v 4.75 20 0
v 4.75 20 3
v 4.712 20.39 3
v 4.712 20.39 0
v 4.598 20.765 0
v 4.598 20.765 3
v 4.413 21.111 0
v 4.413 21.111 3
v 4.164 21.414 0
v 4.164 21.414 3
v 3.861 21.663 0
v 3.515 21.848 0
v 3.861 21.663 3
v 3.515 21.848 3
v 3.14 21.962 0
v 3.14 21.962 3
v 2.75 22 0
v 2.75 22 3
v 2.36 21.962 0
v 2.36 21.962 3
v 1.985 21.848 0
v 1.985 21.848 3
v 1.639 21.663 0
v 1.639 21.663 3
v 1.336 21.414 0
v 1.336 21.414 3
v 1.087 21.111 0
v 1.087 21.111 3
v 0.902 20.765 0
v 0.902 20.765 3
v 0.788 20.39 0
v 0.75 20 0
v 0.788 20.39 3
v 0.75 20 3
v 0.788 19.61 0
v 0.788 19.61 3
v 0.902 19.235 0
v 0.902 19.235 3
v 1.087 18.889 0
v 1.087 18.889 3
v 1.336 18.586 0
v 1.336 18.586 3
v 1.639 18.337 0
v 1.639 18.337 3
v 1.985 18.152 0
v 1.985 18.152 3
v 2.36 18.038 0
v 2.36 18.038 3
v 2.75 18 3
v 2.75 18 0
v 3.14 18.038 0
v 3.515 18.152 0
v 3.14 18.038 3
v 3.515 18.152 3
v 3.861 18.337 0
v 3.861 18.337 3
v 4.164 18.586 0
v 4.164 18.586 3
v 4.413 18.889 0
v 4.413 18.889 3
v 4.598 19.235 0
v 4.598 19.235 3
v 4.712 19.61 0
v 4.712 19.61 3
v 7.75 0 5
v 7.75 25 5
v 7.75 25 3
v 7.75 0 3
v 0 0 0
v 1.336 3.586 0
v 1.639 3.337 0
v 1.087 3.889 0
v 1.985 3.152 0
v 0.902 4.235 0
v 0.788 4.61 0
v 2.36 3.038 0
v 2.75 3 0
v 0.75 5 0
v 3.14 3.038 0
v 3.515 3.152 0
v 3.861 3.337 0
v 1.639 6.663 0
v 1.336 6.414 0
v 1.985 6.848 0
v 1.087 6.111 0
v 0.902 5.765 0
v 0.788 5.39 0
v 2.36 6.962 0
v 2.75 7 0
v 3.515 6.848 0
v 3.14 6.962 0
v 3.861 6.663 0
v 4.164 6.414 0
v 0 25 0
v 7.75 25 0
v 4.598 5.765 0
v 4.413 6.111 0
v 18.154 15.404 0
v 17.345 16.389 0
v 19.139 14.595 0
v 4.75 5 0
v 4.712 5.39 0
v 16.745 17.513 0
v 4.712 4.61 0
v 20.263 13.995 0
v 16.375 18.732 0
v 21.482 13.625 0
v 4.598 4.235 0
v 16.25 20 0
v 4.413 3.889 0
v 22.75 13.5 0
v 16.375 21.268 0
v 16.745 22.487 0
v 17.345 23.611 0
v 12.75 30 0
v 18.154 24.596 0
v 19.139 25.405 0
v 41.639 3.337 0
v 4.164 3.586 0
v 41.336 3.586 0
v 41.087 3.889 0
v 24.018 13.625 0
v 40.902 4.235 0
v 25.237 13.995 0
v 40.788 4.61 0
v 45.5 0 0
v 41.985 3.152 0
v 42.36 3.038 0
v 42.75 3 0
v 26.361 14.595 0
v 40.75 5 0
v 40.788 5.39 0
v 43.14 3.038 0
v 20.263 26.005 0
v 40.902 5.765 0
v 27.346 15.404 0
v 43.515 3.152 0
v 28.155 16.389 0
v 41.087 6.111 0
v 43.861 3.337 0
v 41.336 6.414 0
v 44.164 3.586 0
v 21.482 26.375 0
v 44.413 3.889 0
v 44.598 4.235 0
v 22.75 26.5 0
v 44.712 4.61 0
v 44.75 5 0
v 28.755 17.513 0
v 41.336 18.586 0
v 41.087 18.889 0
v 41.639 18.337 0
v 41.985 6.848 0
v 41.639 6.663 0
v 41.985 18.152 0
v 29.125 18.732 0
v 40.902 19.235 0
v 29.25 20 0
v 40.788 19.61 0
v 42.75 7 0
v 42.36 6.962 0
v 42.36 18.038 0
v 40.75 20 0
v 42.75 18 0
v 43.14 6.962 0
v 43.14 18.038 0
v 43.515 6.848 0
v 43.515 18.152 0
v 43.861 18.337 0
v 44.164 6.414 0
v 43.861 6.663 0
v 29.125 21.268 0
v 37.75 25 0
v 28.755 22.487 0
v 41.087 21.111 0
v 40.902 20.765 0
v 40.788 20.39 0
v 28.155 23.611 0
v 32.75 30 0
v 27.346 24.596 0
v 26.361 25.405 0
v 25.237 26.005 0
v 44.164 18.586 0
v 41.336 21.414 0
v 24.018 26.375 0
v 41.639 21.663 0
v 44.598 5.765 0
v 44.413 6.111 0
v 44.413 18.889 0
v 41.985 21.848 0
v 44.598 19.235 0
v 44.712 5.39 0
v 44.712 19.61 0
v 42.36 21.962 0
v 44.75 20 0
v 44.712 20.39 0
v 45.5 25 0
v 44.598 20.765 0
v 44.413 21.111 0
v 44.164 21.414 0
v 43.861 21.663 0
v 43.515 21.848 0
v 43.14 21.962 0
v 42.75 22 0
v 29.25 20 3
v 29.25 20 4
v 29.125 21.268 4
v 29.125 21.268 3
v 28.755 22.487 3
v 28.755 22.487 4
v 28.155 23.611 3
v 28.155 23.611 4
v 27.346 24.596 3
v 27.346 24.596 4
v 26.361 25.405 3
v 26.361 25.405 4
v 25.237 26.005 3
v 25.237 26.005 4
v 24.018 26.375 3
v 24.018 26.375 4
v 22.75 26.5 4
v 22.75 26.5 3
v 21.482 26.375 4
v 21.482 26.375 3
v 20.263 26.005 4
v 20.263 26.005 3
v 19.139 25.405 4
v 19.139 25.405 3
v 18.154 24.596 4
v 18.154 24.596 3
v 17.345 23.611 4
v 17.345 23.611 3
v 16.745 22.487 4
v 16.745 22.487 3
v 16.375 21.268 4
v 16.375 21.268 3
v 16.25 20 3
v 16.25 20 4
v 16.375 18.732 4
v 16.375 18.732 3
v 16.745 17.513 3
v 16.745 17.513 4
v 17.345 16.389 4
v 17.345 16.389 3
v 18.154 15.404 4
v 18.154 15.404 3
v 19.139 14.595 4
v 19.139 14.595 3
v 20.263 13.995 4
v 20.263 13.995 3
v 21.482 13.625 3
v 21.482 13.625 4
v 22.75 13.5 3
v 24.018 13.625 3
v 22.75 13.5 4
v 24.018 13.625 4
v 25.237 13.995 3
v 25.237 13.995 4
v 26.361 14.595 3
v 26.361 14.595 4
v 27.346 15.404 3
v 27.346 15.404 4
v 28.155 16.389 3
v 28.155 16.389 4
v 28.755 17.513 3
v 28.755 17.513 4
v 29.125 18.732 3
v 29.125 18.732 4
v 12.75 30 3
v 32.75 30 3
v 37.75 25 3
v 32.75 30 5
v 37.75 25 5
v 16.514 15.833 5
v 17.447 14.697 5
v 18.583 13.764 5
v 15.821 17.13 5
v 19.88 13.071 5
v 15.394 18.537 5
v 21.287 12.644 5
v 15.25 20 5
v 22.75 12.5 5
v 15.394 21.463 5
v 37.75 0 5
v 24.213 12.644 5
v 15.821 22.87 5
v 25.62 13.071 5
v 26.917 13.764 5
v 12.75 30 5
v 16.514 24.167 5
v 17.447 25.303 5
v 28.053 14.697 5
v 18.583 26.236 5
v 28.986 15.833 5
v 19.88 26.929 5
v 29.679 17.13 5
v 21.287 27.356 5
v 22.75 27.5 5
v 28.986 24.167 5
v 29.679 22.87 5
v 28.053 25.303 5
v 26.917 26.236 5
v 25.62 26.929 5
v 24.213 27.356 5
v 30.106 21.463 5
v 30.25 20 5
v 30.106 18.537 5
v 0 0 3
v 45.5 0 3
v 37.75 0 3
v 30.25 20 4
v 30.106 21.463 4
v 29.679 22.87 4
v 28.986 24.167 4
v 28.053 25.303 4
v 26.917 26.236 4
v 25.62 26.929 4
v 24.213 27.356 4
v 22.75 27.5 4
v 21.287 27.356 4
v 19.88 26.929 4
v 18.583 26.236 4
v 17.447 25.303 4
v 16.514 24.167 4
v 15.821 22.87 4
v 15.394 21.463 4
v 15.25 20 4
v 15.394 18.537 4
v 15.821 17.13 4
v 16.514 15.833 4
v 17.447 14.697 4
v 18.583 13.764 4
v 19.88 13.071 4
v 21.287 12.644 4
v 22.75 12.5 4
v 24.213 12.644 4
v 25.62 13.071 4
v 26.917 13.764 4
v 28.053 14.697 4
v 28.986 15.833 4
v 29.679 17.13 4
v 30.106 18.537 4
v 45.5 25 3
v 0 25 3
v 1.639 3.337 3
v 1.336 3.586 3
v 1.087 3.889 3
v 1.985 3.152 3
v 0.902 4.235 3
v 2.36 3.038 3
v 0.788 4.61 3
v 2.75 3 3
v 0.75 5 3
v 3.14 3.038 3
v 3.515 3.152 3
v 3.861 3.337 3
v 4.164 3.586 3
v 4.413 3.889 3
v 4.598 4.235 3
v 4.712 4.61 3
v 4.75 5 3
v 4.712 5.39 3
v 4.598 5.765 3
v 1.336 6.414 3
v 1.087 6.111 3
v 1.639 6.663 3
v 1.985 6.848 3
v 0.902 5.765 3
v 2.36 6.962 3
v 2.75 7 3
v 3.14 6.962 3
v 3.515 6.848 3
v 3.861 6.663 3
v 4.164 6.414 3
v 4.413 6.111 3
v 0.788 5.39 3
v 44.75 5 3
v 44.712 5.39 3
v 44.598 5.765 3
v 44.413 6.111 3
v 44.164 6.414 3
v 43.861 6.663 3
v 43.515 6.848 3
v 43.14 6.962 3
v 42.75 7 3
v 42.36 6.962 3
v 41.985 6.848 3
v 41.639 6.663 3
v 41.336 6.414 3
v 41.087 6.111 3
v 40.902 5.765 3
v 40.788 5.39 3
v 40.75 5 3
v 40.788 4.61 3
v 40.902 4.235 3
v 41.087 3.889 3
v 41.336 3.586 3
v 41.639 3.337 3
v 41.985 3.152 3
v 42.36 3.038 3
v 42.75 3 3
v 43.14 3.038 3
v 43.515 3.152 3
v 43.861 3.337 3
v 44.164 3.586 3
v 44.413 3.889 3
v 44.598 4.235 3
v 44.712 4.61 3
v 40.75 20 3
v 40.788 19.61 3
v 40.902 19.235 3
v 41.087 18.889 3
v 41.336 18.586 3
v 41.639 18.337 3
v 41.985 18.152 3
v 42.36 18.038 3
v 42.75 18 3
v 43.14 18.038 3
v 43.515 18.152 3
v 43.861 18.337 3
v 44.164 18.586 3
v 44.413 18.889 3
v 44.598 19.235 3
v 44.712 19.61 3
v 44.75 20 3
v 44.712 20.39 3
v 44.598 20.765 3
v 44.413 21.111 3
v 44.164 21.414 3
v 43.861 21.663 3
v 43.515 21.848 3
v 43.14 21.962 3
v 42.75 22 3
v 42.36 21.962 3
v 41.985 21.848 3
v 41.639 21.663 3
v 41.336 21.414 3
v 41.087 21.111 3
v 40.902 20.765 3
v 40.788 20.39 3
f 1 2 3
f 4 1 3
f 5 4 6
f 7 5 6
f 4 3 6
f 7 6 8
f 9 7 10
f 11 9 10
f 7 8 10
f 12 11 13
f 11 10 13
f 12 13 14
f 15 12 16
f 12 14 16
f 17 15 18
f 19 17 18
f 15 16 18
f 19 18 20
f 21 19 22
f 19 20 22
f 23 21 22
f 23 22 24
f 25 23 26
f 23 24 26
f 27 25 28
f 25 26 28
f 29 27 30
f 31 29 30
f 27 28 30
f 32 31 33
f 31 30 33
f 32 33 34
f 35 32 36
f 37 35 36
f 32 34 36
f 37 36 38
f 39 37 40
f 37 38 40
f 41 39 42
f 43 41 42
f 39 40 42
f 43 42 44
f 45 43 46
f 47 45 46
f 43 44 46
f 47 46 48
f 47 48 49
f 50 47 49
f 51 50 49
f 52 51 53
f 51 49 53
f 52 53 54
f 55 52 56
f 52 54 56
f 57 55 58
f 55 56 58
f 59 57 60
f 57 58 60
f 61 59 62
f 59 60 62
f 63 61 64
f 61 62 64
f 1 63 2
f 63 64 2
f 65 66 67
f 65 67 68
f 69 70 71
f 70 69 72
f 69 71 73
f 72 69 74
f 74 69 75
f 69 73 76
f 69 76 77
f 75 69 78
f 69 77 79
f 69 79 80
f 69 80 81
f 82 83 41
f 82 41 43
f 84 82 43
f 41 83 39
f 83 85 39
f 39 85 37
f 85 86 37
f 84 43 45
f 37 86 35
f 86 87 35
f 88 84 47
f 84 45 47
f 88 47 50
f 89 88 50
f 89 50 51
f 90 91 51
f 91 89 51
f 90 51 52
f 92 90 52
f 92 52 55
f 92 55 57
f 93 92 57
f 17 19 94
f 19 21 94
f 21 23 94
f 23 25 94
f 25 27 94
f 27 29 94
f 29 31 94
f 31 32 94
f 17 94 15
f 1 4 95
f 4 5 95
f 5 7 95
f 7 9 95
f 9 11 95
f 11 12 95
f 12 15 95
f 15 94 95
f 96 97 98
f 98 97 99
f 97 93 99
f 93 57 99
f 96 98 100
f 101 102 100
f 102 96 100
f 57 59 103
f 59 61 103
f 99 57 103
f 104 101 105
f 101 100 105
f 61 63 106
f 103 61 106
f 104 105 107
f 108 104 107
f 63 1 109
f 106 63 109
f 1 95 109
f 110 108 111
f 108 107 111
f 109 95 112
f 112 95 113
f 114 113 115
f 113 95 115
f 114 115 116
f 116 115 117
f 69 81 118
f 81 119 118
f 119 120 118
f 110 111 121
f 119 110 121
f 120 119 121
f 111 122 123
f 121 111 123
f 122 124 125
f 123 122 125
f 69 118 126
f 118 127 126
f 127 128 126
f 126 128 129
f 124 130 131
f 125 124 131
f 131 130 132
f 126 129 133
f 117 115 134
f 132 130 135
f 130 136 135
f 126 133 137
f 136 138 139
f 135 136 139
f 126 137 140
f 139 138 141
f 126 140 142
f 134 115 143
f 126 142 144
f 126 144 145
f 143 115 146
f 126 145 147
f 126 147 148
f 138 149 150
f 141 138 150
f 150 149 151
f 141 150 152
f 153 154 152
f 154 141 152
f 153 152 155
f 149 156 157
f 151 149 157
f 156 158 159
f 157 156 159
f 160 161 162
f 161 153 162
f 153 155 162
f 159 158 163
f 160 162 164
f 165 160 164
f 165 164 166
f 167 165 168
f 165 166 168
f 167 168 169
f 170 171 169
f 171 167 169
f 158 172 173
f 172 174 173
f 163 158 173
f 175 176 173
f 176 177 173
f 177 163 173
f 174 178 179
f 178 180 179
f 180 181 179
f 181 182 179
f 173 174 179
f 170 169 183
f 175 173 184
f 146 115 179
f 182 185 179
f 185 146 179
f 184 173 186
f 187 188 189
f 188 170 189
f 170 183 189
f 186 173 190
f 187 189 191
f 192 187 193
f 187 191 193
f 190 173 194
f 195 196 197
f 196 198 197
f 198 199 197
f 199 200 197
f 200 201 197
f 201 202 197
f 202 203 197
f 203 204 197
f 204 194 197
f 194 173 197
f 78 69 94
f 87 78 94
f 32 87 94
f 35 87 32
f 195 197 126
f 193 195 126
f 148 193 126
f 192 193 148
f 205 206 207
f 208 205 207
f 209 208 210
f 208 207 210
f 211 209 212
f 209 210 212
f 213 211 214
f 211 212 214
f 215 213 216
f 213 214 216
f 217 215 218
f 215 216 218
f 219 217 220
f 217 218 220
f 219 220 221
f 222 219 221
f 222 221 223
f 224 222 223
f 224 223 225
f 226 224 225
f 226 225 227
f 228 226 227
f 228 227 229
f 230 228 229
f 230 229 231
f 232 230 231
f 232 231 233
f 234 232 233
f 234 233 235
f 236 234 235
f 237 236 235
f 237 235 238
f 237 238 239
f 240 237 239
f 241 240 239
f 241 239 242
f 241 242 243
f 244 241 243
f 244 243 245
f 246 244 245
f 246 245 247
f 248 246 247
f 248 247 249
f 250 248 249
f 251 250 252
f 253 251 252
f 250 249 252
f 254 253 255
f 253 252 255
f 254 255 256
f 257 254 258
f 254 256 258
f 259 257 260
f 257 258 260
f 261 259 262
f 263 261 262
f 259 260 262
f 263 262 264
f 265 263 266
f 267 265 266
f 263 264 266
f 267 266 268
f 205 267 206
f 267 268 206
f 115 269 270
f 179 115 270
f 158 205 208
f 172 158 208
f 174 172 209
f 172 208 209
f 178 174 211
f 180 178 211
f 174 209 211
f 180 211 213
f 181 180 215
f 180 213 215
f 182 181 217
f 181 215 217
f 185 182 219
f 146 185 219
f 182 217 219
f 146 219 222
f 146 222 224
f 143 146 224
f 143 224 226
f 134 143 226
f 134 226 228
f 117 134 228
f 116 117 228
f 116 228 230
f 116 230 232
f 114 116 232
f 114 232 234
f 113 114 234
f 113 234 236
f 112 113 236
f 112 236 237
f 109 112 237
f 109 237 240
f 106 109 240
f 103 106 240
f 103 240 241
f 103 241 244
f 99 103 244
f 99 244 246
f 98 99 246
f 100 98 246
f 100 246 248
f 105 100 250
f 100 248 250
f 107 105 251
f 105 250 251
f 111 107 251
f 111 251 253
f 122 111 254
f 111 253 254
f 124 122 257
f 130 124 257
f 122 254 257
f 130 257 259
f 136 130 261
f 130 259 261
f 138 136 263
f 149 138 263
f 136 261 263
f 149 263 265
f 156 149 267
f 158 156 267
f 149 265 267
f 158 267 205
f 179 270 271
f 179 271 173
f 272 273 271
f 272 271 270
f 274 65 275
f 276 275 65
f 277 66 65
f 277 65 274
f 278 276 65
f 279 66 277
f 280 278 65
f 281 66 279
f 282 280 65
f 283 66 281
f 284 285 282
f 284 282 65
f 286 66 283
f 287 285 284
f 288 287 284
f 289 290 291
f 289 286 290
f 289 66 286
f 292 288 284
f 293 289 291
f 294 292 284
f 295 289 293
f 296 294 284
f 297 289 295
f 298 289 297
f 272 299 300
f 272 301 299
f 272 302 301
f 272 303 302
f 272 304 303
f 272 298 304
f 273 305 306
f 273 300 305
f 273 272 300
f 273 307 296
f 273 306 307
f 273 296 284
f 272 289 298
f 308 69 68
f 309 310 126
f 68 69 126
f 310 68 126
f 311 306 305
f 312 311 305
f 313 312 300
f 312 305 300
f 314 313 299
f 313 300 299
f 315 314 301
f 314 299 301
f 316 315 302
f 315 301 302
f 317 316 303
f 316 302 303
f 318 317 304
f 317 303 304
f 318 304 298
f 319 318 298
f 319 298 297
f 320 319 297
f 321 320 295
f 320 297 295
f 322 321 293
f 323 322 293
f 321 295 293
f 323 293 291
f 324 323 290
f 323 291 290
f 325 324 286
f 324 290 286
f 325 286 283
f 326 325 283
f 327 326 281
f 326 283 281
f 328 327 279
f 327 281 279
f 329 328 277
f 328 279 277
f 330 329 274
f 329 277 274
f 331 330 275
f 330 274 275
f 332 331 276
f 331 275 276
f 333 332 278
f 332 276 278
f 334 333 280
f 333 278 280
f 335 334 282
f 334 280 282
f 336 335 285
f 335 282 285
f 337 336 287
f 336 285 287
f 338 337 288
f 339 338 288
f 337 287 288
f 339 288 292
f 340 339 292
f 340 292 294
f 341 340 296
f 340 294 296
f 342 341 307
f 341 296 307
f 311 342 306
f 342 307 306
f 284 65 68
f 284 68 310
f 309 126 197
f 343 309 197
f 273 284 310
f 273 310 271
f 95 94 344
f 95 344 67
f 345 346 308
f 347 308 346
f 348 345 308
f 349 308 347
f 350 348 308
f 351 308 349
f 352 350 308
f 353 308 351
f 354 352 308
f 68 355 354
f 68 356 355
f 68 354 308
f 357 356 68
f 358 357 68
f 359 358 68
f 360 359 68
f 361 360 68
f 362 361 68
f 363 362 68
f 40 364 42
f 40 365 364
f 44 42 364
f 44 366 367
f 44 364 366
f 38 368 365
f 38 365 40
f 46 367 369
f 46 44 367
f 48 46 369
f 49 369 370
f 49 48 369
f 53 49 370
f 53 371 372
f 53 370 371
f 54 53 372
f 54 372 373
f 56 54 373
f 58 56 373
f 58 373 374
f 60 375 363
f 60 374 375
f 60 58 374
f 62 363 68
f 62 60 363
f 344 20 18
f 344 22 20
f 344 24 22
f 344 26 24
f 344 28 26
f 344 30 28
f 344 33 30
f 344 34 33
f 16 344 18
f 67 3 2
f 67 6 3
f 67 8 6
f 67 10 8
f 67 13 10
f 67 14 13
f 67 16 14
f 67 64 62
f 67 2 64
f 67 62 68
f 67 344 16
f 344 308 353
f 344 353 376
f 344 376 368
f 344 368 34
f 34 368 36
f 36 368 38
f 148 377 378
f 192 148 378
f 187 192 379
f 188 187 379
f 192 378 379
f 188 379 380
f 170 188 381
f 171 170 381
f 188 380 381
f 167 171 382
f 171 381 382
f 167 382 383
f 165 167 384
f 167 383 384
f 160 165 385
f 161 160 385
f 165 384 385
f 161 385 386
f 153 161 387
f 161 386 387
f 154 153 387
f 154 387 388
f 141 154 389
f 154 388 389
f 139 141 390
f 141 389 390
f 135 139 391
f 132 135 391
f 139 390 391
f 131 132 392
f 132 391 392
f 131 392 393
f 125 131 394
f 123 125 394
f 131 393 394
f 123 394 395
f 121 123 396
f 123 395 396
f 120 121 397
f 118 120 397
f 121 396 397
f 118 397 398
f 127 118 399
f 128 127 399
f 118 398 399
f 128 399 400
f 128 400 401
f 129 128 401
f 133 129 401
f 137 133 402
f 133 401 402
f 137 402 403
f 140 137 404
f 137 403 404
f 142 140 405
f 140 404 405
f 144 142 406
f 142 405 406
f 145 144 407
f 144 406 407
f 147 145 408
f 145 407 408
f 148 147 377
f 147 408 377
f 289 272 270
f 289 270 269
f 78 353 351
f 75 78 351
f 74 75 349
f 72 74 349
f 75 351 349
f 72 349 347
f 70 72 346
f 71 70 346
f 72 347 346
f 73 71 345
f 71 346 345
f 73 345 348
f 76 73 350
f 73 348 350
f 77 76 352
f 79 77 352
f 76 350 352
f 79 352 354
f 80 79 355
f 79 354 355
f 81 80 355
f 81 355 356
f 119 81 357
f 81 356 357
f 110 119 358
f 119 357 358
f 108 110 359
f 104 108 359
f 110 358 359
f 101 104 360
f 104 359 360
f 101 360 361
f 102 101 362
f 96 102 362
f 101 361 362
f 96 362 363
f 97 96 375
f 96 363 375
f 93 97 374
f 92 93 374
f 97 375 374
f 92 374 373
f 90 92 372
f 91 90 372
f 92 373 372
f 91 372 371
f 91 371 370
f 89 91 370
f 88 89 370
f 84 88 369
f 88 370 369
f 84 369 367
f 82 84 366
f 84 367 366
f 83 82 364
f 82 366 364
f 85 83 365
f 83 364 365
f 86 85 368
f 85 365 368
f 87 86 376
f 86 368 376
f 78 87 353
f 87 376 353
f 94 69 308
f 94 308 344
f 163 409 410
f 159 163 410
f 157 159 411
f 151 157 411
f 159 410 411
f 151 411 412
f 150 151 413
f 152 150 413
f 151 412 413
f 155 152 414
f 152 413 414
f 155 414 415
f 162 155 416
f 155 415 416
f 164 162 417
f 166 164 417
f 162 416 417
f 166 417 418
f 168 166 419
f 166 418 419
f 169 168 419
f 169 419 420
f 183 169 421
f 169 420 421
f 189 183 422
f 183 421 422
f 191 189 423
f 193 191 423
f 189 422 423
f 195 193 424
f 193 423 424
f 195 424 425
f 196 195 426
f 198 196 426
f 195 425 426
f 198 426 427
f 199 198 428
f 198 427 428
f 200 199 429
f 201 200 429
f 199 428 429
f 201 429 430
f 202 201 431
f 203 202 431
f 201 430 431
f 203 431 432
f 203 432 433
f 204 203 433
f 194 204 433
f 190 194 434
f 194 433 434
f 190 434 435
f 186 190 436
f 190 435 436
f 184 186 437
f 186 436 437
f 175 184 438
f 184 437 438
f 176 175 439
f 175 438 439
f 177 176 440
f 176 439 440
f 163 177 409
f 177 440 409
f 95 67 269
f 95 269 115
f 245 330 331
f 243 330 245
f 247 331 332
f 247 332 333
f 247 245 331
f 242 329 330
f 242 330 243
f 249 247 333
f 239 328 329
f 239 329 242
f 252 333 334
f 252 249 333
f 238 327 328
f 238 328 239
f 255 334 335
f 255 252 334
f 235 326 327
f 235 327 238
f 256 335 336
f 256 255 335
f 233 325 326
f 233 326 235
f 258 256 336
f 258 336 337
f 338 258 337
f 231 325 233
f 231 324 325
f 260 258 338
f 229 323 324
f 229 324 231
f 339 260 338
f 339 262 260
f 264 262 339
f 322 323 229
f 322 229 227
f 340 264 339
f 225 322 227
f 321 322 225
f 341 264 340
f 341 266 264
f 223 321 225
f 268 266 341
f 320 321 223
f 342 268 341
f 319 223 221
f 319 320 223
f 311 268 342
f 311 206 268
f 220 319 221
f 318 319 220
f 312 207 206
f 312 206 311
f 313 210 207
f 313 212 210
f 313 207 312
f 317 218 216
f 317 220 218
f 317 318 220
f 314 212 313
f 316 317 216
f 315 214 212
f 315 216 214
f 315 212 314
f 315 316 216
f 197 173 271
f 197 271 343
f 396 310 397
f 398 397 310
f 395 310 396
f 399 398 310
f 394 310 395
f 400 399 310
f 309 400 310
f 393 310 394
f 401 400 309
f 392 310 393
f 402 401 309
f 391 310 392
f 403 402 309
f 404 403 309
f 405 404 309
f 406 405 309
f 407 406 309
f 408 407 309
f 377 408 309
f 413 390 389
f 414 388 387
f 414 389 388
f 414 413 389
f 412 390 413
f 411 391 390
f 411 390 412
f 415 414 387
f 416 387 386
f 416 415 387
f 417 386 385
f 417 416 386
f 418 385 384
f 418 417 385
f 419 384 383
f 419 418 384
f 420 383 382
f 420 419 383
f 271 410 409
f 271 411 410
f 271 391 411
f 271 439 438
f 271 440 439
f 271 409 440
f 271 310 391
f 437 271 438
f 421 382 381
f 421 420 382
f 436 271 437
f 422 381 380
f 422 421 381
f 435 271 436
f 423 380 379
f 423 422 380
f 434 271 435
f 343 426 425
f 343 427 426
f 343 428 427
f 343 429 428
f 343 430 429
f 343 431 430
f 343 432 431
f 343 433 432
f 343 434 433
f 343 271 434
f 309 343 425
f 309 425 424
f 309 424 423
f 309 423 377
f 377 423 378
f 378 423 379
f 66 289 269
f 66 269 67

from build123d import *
from build123d.topology import SkipClean

# Parameters (mm, degrees)
ESQUISSE1_W             = 45.5
ESQUISSE1_H             = 25
BOSS_EXTRU_1_DEPTH      = 3
ESQUISSE2_R             = 2
ENL_V_MAT_EXTRU_1_DEPTH = 3
ESQUISSE4_W             = 20
ESQUISSE4_H             = 5
BOSS_EXTRU_2_DEPTH      = 3
ESQUISSE3_R             = 6.5
ENL_V_MAT_EXTRU_2_DEPTH = 55.582506355
CHANFREIN1_SIZE         = 5
BOSS_EXTRU_3_START      = 2
ESQUISSE5_R             = 6.5
BOSS_EXTRU_3_DEPTH      = 2
ESQUISSE6_R             = 7.5
ENL_V_MAT_EXTRU_3_DEPTH = 1


with BuildPart() as part:
    # Esquisse1 → Boss.-Extru.1 (new body)
    with BuildSketch(Plane.XY):
        with Locations((22.75, 12.5)):
            Rectangle(ESQUISSE1_W, ESQUISSE1_H)
    extrude(amount=BOSS_EXTRU_1_DEPTH)

    # Esquisse2 → Enlèv. mat.-Extru.1 (cut)
    with BuildSketch(Plane.XY.offset(3)):
        with Locations((2.75, 20)):
            Circle(ESQUISSE2_R)
        with Locations(Location((42.75, 20, 0), (0, 0, 180))):
            Circle(ESQUISSE2_R)
        with Locations((42.75, 5)):
            Circle(ESQUISSE2_R)
        with Locations(Location((2.75, 5, 0), (0, 0, 180))):
            Circle(ESQUISSE2_R)
    extrude(amount=-ENL_V_MAT_EXTRU_1_DEPTH, mode=Mode.SUBTRACT)

    # Esquisse4 → Boss.-Extru.2 (add)
    with BuildSketch(Plane.XY.offset(3)):
        with Locations((22.75, 27.5)):
            Rectangle(ESQUISSE4_W, ESQUISSE4_H)
    extrude(amount=-BOSS_EXTRU_2_DEPTH)

    # Esquisse3 → Enlèv. mat.-Extru.2 (cut, through all)
    with BuildSketch(Plane.XY.offset(3)):
        with Locations((22.75, 20)):
            Circle(ESQUISSE3_R)
    extrude(amount=-ENL_V_MAT_EXTRU_2_DEPTH, mode=Mode.SUBTRACT)

    # Chanfrein1
    chanfrein1_edges = [part.edges().sort_by_distance(p)[0] for p in [
        (32.75, 25, 1.5),
        (12.75, 25, 1.5),
    ]]
    chamfer(chanfrein1_edges, length=CHANFREIN1_SIZE - 0.0001)  # a hair under: the kernel refuses the full size

    # Esquisse5 → Boss.-Extru.3 (add)
    with SkipClean():  # the faces are left unmerged after this step: merging them gives an invalid solid
        with BuildSketch(Plane.XY.offset(3).offset(BOSS_EXTRU_3_START)):
            Polygon((32.75, 30), (12.75, 30), (7.75, 25), (7.75, 0), (37.75, 0), (37.75, 25), align=None)
            with Locations((22.75, 20)):
                Circle(ESQUISSE5_R, mode=Mode.SUBTRACT)
        extrude(amount=-BOSS_EXTRU_3_DEPTH)

    # Esquisse6 → Enlèv. mat.-Extru.3 (cut)
    with SkipClean():  # the faces are left unmerged after this step: merging them gives an invalid solid
        with BuildSketch(Plane.XY.offset(5)):
            with Locations((22.75, 20)):
                Circle(ESQUISSE6_R)
        extrude(amount=-ENL_V_MAT_EXTRU_3_DEPTH, mode=Mode.SUBTRACT)


solid = part.part
